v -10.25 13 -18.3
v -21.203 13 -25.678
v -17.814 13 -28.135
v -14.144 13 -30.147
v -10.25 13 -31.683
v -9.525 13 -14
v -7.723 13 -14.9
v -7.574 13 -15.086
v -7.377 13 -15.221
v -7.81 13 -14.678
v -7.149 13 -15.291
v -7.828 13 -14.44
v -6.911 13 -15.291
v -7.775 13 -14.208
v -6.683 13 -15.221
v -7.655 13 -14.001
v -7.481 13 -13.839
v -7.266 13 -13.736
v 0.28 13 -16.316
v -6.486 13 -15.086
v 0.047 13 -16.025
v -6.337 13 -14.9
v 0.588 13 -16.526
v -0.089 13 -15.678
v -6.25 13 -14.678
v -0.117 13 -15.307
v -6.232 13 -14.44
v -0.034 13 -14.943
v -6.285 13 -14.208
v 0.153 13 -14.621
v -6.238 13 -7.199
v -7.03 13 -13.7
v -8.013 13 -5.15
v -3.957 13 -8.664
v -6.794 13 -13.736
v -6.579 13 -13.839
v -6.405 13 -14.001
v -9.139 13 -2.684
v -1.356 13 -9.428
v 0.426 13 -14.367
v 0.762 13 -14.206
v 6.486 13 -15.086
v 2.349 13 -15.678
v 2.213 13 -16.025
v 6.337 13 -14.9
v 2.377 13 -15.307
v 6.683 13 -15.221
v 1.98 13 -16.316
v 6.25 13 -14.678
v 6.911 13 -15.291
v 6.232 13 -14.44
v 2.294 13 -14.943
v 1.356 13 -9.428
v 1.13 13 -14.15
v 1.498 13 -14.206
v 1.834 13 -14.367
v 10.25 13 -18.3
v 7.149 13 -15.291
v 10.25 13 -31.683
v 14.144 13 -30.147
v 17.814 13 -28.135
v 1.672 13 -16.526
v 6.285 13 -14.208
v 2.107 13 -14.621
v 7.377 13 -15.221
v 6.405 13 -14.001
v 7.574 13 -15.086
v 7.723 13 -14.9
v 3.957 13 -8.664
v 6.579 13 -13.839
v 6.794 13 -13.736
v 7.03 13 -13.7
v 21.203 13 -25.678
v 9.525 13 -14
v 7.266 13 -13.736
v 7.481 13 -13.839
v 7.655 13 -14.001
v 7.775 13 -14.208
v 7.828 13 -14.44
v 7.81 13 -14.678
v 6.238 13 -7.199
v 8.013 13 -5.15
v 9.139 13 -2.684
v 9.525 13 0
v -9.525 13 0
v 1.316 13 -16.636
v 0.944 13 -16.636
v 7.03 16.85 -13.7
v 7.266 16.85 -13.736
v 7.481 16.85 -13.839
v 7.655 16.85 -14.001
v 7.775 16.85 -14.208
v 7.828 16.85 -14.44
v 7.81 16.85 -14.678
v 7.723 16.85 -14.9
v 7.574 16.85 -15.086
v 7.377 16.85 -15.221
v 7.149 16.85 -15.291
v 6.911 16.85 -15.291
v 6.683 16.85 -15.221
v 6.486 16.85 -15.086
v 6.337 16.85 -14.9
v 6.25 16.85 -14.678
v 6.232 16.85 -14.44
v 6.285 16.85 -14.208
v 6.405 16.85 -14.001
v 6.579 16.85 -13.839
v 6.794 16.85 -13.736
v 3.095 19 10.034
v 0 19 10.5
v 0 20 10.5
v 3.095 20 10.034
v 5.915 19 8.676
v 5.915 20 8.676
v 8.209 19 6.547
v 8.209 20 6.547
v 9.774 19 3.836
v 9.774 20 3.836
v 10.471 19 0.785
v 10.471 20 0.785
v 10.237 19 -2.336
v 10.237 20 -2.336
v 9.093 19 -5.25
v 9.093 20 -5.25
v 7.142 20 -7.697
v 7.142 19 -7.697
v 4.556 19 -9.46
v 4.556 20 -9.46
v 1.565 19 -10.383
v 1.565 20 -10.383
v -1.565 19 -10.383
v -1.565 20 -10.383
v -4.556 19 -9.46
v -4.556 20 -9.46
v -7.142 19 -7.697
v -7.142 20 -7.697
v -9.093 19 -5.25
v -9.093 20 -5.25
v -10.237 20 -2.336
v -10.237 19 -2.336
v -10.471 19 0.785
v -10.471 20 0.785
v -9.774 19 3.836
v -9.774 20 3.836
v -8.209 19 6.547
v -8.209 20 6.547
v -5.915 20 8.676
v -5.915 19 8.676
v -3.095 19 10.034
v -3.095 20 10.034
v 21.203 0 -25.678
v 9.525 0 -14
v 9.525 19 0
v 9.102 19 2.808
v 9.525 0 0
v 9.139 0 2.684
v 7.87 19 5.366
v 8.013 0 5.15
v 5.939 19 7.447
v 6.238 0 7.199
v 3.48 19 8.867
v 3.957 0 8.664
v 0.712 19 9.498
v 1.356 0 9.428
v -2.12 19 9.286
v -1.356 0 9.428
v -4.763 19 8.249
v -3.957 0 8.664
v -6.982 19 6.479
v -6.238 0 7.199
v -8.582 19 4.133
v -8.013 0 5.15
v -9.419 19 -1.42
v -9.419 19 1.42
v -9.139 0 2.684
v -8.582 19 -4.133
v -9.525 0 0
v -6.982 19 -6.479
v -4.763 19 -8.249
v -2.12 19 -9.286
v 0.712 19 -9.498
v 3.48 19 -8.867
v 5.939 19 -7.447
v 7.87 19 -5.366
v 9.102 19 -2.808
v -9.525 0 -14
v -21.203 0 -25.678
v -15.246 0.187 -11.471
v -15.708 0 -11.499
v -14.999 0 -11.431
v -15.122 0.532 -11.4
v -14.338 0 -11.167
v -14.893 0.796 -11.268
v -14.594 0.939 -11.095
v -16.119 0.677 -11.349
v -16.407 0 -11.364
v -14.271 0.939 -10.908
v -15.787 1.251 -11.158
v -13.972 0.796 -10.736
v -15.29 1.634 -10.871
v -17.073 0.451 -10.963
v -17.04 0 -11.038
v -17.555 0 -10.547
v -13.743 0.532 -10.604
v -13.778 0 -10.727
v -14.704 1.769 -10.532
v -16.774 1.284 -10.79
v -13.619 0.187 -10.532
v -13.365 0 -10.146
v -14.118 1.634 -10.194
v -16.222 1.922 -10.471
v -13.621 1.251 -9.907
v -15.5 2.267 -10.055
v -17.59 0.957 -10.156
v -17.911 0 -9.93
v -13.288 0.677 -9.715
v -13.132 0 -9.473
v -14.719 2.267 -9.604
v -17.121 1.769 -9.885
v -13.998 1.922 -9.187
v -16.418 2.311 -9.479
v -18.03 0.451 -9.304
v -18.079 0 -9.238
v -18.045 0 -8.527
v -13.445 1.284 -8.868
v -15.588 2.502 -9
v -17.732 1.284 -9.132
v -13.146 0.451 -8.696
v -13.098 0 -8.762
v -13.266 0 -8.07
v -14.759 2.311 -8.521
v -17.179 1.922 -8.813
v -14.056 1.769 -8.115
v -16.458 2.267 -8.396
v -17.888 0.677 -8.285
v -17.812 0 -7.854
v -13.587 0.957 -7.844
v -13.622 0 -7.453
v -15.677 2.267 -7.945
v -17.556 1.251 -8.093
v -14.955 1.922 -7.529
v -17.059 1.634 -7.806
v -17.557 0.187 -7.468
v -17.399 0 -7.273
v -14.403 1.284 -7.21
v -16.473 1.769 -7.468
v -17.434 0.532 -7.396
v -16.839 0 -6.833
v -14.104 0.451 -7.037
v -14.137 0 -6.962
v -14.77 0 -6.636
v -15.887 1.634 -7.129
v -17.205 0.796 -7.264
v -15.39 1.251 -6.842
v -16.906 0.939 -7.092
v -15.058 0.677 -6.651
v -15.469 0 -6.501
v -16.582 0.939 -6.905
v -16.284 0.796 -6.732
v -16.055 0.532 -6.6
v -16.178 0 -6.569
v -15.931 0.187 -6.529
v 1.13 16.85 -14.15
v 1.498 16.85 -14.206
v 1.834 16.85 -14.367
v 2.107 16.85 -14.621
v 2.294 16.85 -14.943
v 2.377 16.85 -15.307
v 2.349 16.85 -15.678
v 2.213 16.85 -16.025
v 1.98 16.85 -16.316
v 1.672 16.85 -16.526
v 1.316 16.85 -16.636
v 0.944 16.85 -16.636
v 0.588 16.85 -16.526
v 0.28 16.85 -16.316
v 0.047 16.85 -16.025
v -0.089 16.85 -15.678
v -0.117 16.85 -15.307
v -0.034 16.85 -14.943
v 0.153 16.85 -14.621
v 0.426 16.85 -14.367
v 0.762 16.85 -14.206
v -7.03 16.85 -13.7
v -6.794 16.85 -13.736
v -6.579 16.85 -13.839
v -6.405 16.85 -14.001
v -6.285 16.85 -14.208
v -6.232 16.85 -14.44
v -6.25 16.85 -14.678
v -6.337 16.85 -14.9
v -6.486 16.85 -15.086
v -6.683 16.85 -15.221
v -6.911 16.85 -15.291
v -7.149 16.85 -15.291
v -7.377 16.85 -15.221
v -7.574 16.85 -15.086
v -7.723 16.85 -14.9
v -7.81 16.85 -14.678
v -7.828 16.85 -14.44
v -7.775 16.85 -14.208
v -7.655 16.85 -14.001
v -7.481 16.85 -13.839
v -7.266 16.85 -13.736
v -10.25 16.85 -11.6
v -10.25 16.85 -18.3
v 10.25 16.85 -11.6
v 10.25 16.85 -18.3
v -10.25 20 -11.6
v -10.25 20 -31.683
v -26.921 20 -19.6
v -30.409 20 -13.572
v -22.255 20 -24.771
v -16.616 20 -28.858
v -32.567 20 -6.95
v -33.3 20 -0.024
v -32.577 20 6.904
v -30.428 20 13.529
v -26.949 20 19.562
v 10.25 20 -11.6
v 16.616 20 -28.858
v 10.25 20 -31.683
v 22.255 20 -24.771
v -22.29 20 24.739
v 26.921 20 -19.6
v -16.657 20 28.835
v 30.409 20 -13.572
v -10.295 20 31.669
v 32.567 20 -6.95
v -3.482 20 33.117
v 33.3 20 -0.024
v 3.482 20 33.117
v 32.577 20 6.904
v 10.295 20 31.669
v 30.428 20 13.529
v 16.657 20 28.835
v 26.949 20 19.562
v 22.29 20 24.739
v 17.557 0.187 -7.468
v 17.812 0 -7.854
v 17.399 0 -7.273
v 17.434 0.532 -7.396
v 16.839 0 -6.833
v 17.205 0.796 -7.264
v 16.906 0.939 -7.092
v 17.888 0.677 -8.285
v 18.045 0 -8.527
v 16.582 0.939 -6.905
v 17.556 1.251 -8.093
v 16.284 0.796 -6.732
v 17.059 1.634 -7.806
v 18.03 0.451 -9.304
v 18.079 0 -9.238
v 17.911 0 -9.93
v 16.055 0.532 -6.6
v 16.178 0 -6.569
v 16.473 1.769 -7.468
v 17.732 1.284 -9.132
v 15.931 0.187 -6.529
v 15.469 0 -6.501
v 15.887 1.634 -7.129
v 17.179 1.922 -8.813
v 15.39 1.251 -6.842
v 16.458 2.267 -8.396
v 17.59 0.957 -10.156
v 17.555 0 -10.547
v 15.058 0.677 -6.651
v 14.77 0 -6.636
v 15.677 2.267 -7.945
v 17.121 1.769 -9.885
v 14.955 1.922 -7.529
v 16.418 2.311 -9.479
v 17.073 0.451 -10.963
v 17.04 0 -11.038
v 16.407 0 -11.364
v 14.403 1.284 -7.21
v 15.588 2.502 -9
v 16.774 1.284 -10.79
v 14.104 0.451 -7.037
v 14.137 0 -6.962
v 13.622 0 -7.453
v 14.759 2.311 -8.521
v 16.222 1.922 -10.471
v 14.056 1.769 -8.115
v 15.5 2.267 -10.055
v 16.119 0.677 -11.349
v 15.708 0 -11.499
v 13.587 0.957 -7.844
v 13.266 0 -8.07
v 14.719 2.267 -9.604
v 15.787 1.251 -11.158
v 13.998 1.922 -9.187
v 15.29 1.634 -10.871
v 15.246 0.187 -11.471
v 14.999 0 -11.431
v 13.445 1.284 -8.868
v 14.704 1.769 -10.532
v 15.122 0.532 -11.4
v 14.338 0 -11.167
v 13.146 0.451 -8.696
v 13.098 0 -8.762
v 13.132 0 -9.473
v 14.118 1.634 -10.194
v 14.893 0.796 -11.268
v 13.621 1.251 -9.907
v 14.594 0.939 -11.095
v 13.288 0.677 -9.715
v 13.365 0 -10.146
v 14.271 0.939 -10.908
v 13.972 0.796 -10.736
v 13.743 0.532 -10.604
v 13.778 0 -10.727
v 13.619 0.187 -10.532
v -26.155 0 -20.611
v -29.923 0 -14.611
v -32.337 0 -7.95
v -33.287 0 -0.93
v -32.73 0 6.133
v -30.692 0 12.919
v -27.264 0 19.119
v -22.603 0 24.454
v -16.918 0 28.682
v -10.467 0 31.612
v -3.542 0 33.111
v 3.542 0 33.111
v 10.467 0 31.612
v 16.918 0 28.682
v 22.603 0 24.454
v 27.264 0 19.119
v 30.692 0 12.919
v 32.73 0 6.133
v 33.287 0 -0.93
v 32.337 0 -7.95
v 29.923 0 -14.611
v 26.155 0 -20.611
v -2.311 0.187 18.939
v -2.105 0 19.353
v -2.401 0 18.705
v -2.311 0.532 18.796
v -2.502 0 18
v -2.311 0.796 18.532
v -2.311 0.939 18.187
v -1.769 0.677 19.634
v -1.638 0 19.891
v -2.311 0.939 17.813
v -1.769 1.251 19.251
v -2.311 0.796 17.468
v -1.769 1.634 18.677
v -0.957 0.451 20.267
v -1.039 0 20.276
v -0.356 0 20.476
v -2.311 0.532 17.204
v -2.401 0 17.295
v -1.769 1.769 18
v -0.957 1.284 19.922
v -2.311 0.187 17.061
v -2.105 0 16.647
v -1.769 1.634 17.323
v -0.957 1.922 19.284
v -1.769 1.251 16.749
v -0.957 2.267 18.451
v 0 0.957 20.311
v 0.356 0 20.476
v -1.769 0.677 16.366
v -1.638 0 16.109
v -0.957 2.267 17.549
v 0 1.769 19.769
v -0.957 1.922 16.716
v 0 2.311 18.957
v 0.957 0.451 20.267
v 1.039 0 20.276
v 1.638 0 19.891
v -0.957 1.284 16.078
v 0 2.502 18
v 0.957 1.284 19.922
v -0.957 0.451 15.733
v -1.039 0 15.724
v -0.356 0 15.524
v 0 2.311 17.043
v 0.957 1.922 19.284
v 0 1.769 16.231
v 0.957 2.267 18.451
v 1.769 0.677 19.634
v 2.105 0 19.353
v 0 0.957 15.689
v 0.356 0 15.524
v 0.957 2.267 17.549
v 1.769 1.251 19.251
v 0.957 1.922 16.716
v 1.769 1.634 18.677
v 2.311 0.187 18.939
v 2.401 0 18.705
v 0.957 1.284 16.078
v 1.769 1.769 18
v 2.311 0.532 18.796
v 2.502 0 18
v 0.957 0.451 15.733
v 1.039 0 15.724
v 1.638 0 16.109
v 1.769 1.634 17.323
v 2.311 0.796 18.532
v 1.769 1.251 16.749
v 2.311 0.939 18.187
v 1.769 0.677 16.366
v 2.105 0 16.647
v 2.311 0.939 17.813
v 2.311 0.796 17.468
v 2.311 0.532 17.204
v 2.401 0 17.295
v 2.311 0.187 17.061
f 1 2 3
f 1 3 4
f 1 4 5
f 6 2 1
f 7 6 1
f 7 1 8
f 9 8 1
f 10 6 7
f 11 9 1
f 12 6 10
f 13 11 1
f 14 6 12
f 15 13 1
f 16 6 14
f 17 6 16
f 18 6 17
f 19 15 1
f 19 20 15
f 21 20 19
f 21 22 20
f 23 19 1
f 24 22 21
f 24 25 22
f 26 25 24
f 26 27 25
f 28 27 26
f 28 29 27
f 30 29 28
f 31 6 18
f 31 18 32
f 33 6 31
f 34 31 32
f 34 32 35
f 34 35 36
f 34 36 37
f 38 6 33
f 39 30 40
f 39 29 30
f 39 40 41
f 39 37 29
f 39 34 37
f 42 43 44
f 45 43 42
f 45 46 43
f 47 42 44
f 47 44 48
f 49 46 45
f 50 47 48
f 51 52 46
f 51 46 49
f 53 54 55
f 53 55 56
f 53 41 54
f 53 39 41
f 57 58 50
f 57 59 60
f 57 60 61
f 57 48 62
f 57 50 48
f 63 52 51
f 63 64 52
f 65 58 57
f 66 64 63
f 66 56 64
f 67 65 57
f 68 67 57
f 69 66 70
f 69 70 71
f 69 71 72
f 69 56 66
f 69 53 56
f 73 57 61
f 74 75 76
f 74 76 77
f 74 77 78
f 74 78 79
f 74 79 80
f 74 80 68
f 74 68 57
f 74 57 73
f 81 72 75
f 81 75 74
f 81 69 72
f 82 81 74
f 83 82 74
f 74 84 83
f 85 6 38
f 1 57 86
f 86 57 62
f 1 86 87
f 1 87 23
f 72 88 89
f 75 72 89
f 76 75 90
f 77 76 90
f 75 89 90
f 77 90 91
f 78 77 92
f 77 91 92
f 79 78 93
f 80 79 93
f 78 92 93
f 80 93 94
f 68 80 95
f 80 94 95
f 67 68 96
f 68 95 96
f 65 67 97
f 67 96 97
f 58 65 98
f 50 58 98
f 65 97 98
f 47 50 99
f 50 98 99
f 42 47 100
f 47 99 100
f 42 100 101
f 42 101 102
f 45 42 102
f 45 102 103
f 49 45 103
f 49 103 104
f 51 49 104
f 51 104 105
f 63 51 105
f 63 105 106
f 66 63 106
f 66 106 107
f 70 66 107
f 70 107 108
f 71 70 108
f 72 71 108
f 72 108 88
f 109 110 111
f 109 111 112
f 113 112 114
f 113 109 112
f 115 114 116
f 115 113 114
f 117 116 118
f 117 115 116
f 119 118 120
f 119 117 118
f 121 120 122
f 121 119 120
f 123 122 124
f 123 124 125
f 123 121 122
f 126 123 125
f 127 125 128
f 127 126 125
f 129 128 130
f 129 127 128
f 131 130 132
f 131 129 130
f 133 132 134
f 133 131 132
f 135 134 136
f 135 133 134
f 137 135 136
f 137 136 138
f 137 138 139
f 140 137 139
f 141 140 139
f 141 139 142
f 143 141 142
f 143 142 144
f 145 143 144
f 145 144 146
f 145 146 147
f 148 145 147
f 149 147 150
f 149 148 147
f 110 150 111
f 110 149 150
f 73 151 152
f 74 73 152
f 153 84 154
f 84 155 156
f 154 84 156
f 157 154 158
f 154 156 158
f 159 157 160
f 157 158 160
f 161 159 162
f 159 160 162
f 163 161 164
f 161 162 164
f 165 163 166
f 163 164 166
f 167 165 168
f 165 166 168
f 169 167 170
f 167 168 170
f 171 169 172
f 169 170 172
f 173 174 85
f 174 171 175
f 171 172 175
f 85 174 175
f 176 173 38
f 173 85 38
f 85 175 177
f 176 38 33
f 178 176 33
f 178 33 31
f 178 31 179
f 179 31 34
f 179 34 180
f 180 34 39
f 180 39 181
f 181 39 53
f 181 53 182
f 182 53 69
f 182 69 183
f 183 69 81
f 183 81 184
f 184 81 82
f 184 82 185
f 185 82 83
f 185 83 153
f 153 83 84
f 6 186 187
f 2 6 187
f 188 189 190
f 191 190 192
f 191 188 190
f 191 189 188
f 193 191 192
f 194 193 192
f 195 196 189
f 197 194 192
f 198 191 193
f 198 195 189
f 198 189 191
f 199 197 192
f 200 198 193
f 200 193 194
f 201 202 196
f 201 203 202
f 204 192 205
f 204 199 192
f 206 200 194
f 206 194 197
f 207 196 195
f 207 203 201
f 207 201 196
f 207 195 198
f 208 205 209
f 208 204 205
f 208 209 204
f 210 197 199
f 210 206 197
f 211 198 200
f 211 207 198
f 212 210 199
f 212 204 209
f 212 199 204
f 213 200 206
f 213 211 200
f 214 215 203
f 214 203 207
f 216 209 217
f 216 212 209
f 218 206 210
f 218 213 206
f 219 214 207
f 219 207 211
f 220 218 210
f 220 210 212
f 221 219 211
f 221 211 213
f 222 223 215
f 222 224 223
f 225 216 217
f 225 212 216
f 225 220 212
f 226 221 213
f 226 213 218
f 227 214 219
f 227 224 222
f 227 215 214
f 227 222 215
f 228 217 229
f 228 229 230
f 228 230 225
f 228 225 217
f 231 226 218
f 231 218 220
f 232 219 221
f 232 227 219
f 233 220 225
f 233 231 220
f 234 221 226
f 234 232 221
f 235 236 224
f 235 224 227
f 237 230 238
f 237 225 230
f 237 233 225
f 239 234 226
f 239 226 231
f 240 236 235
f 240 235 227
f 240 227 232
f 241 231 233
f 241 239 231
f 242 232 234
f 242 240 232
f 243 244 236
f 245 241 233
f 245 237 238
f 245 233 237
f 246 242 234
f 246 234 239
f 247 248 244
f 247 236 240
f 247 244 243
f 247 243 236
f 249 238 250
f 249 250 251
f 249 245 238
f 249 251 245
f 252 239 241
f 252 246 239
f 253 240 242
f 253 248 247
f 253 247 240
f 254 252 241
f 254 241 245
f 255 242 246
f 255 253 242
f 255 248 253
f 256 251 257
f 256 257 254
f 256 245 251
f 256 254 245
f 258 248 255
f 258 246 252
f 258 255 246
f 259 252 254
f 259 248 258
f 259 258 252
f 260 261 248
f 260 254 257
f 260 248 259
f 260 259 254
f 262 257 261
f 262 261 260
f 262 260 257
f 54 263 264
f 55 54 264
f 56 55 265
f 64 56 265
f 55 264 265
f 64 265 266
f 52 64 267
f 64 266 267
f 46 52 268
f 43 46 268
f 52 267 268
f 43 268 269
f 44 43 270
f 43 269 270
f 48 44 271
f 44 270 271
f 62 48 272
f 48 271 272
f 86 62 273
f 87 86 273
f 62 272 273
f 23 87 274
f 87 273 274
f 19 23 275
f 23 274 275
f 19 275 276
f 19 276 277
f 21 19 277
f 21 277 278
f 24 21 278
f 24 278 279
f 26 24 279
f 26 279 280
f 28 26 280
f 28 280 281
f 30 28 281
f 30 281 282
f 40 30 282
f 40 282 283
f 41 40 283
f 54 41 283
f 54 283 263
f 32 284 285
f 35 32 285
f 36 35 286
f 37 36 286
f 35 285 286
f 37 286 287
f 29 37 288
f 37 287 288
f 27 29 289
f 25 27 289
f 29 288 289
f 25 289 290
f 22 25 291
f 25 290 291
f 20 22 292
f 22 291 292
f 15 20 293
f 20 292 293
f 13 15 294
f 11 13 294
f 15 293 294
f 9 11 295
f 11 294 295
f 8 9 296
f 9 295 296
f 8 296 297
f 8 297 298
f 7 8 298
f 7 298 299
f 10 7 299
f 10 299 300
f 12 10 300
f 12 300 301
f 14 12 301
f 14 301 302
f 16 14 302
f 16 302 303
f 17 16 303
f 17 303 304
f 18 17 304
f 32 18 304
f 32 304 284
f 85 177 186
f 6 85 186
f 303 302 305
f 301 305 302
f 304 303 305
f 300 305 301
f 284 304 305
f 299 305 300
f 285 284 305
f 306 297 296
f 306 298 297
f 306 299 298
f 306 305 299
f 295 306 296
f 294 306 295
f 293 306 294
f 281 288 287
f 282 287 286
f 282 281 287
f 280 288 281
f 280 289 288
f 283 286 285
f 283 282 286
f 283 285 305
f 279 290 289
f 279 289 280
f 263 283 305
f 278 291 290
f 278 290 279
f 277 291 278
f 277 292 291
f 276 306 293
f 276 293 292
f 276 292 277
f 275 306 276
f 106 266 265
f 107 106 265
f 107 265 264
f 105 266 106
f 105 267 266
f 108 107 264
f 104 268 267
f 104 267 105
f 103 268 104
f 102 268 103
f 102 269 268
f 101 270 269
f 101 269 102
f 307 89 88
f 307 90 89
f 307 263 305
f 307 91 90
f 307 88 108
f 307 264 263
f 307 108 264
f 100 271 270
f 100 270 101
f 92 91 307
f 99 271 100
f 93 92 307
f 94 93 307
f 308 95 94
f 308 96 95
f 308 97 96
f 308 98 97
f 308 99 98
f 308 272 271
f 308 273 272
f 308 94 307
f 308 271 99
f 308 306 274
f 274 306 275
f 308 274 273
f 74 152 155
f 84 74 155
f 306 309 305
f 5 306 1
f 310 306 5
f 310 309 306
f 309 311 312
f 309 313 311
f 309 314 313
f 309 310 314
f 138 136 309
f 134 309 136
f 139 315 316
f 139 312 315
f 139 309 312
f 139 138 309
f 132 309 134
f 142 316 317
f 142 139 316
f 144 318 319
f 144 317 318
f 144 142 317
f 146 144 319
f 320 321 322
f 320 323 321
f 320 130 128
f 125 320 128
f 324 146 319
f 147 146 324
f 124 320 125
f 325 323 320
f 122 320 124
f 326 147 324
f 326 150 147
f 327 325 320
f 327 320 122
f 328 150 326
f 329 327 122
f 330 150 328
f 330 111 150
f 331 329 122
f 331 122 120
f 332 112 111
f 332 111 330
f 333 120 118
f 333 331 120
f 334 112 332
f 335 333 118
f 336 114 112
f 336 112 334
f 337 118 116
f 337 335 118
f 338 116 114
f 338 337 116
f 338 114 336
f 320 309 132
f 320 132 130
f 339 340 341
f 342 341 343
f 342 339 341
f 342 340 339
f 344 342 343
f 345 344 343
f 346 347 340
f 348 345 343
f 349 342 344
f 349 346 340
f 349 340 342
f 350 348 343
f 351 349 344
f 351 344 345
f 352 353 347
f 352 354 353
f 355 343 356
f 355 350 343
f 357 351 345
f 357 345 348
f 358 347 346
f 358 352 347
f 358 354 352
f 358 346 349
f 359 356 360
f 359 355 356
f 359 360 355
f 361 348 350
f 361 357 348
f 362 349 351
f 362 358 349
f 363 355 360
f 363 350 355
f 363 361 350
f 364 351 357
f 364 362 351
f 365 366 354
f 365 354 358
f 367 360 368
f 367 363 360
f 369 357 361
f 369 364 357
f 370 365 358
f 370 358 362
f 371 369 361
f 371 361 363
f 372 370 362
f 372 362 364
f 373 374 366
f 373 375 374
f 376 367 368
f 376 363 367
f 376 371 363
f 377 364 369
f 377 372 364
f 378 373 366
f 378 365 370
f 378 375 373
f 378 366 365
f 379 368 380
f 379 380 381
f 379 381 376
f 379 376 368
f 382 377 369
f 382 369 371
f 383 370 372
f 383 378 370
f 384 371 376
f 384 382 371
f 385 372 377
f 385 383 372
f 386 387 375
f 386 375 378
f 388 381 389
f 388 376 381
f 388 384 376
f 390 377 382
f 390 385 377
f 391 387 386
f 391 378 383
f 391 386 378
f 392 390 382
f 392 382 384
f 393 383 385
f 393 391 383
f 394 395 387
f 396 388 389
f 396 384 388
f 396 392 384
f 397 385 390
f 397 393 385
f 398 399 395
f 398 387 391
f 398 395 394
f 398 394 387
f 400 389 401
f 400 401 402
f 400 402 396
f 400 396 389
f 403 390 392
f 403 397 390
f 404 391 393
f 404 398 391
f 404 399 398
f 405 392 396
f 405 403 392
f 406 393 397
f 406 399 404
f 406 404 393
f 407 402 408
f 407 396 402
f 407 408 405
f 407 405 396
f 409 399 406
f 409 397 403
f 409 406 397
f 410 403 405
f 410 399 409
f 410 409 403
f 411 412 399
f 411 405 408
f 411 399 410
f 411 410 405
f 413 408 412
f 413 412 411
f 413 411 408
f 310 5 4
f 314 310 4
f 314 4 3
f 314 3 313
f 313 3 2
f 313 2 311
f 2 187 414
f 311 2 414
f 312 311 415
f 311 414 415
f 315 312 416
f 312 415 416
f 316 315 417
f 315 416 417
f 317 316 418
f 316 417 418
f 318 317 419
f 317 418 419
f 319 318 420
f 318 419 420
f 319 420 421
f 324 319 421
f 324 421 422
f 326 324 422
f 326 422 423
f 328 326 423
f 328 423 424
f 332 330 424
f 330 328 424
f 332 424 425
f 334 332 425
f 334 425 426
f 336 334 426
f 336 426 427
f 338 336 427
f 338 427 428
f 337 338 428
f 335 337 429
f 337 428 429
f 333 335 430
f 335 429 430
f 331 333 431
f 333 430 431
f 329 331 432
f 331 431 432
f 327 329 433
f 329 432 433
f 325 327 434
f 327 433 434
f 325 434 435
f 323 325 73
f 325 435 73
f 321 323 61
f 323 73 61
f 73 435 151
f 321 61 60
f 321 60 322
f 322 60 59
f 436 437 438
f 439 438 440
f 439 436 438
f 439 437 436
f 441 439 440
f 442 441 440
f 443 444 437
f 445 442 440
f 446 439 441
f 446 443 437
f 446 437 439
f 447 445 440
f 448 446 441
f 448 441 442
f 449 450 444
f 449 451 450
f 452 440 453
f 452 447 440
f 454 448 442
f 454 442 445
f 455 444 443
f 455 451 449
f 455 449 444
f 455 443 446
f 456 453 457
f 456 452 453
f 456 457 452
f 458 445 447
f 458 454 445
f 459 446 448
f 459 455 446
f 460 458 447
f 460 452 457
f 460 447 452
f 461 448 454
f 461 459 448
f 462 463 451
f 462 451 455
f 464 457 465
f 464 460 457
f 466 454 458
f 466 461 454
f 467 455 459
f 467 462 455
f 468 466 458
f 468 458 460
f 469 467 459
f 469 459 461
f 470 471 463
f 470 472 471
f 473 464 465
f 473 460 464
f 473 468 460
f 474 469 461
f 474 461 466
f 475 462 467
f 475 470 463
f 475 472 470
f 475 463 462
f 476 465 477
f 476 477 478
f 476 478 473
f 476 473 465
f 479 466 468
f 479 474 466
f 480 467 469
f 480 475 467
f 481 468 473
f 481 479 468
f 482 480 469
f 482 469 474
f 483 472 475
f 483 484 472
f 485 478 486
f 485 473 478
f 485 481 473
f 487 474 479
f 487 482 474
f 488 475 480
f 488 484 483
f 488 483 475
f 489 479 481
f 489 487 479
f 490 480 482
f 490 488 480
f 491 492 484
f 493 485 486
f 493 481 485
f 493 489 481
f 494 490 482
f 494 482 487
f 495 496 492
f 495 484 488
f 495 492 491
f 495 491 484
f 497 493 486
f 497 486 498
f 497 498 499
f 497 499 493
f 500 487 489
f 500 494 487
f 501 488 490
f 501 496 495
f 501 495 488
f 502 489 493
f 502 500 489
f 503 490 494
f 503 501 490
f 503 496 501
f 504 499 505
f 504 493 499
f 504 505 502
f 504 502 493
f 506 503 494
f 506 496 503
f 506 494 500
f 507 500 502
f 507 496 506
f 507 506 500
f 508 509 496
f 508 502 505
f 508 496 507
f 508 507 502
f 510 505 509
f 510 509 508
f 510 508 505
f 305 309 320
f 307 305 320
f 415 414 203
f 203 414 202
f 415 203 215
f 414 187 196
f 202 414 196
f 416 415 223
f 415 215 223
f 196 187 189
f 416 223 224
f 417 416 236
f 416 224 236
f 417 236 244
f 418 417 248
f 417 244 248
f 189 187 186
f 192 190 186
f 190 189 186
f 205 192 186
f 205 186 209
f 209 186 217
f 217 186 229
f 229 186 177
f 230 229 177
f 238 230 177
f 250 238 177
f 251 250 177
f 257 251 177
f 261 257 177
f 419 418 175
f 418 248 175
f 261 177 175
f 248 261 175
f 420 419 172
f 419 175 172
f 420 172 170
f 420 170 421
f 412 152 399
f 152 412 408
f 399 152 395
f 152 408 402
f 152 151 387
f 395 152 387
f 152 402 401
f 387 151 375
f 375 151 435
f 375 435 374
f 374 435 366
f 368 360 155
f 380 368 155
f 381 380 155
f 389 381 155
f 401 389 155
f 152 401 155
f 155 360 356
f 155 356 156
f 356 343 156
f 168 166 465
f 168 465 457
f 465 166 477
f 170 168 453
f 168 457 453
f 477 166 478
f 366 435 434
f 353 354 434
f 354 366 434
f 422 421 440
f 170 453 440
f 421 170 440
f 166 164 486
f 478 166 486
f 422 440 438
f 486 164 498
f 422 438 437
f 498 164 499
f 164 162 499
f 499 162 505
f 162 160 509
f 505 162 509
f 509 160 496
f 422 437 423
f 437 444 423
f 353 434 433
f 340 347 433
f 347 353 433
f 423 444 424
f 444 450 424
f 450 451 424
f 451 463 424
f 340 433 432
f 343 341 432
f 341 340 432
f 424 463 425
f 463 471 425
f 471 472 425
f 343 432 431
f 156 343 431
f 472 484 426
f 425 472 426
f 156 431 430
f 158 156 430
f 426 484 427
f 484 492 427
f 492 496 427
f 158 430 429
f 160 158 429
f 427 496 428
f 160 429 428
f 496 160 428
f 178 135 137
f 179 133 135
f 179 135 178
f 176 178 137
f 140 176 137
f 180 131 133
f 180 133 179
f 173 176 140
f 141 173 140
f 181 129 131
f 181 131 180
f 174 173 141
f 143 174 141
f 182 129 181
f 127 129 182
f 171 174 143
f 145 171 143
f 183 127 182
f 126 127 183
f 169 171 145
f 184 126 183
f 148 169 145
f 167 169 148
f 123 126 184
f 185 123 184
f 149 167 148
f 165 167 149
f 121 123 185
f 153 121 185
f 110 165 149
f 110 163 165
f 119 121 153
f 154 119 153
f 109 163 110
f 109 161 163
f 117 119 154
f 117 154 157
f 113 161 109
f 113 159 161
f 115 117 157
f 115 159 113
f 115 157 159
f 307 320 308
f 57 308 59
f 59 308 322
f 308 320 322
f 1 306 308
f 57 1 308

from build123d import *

# Parameters (mm, degrees)
SKETCH1_R           = 33.3
BOSS_EXTRUDE1_DEPTH = 20
CIRPATTERN1_COUNT   = 3
CUT_EXTRUDE1_DEPTH  = 13
CUT_EXTRUDE3_REACH  = 53.164
SKETCH6_R           = 9.525
CUT_EXTRUDE4_START  = -1
SKETCH6_4_R         = 10.5
SKETCH6_4_R_2       = 9.525
CUT_EXTRUDE4_DEPTH  = 1
SKETCH7_R           = 0.8
SKETCH7_R_2         = 1.25
CUT_EXTRUDE5_DEPTH  = 52.164245328
SKETCH8_W           = 20.5
SKETCH8_H           = 25
CUT_EXTRUDE6_DEPTH  = 3.15
CUT_EXTRUDE7_REACH  = 52.017
SKETCH9_W           = 20.5
SKETCH9_H           = 20


with BuildPart() as part:
    # Sketch1 → Boss-Extrude1 (new body)
    with BuildSketch(Plane(origin=(0, 0, 0), x_dir=(1, 0, 0), z_dir=(0, 1, 0))):
        Circle(SKETCH1_R)
    extrude(amount=BOSS_EXTRUDE1_DEPTH)

    # Sketch3 → Cut-Revolve7 (revolve, cut)
    with BuildSketch(Plane.XZ):
        with BuildLine():
            Line((2.5019, 18), (-2.5019, 18))
            ThreePointArc((-2.5019, 18), (0, 15.4981), (2.5019, 18))
        make_face()
    cut_revolve7 = revolve(axis=Axis((3.292813159, 0, 18), (-1, 0, 0)), mode=Mode.SUBTRACT)

    # CirPattern1: Cut-Revolve7 ×3 about axis
    cirpattern1_axis = Axis((0, 0, 0), (0, 1, 0))
    for i in range(1, CIRPATTERN1_COUNT):
        add(cut_revolve7.rotate(cirpattern1_axis, i * 360 / CIRPATTERN1_COUNT), mode=Mode.SUBTRACT)

    # Sketch5 → Cut-Extrude1 (cut)
    with BuildSketch(Plane.XZ):
        with BuildLine():
            Line((9.525, -14), (9.525, 0))
            ThreePointArc((9.525, 0), (0, 9.525), (-9.525, 0))
            Line((-9.525, 0), (-9.525, -14))
            Line((-9.525, -14), (-21.202606522, -25.677606522))
            ThreePointArc((-21.202606522, -25.677606522), (0, -33.3), (21.202606522, -25.677606522))
            Line((21.202606522, -25.677606522), (9.525, -14))
        make_face()
    extrude(amount=-CUT_EXTRUDE1_DEPTH, mode=Mode.SUBTRACT)

    # Sketch6 → Cut-Extrude3 (cut, up to next)
    with BuildSketch(Plane(origin=(0, 20, 0), x_dir=(1, 0, 0), z_dir=(0, 1, 0)), mode=Mode.PRIVATE) as cut_extrude3_sk1:
        Circle(SKETCH6_R)
    cut_extrude3_tool1 = extrude(cut_extrude3_sk1.sketch, amount=-CUT_EXTRUDE3_REACH, mode=Mode.PRIVATE) & part.part
    add(cut_extrude3_tool1.solids().sort_by_distance((0, 20, 0))[0], mode=Mode.SUBTRACT)

    # Sketch6<4> → Cut-Extrude4 (cut)
    with BuildSketch(Plane(origin=(0, 20, 0), x_dir=(1, 0, 0), z_dir=(0, 1, 0)).offset(CUT_EXTRUDE4_START)):
        Circle(SKETCH6_4_R)
        Circle(SKETCH6_4_R_2, mode=Mode.SUBTRACT)
    extrude(amount=CUT_EXTRUDE4_DEPTH, mode=Mode.SUBTRACT)

    # Sketch7 → Cut-Extrude5 (cut, through all)
    with BuildSketch(Plane(origin=(0, 20, 0), x_dir=(1, 0, 0), z_dir=(0, 1, 0))):
        with Locations((-7.03, 14.5)):
            Circle(SKETCH7_R)
        with Locations((7.03, 14.5)):
            Circle(SKETCH7_R)
        with Locations((1.13, 15.4)):
            Circle(SKETCH7_R_2)
    extrude(amount=-CUT_EXTRUDE5_DEPTH, mode=Mode.SUBTRACT)

    # Sketch8 → Cut-Extrude6 (cut)
    with BuildSketch(Plane(origin=(0, 20, 0), x_dir=(1, 0, 0), z_dir=(0, 1, 0))):
        with Locations((0, 24.1)):
            Rectangle(SKETCH8_W, SKETCH8_H)
    extrude(amount=-CUT_EXTRUDE6_DEPTH, mode=Mode.SUBTRACT)

    # Sketch9 → Cut-Extrude7 (cut, up to next)
    with BuildSketch(Plane(origin=(0, 16.85, 0), x_dir=(1, 0, 0), z_dir=(0, 1, 0)), mode=Mode.PRIVATE) as cut_extrude7_sk1:
        with Locations((0, 28.3)):
            Rectangle(SKETCH9_W, SKETCH9_H)
    cut_extrude7_tool1 = extrude(cut_extrude7_sk1.sketch, amount=-CUT_EXTRUDE7_REACH, mode=Mode.PRIVATE) & part.part
    add(cut_extrude7_tool1.solids().sort_by_distance((0, 16.85, -28.3))[0], mode=Mode.SUBTRACT)


solid = part.part
